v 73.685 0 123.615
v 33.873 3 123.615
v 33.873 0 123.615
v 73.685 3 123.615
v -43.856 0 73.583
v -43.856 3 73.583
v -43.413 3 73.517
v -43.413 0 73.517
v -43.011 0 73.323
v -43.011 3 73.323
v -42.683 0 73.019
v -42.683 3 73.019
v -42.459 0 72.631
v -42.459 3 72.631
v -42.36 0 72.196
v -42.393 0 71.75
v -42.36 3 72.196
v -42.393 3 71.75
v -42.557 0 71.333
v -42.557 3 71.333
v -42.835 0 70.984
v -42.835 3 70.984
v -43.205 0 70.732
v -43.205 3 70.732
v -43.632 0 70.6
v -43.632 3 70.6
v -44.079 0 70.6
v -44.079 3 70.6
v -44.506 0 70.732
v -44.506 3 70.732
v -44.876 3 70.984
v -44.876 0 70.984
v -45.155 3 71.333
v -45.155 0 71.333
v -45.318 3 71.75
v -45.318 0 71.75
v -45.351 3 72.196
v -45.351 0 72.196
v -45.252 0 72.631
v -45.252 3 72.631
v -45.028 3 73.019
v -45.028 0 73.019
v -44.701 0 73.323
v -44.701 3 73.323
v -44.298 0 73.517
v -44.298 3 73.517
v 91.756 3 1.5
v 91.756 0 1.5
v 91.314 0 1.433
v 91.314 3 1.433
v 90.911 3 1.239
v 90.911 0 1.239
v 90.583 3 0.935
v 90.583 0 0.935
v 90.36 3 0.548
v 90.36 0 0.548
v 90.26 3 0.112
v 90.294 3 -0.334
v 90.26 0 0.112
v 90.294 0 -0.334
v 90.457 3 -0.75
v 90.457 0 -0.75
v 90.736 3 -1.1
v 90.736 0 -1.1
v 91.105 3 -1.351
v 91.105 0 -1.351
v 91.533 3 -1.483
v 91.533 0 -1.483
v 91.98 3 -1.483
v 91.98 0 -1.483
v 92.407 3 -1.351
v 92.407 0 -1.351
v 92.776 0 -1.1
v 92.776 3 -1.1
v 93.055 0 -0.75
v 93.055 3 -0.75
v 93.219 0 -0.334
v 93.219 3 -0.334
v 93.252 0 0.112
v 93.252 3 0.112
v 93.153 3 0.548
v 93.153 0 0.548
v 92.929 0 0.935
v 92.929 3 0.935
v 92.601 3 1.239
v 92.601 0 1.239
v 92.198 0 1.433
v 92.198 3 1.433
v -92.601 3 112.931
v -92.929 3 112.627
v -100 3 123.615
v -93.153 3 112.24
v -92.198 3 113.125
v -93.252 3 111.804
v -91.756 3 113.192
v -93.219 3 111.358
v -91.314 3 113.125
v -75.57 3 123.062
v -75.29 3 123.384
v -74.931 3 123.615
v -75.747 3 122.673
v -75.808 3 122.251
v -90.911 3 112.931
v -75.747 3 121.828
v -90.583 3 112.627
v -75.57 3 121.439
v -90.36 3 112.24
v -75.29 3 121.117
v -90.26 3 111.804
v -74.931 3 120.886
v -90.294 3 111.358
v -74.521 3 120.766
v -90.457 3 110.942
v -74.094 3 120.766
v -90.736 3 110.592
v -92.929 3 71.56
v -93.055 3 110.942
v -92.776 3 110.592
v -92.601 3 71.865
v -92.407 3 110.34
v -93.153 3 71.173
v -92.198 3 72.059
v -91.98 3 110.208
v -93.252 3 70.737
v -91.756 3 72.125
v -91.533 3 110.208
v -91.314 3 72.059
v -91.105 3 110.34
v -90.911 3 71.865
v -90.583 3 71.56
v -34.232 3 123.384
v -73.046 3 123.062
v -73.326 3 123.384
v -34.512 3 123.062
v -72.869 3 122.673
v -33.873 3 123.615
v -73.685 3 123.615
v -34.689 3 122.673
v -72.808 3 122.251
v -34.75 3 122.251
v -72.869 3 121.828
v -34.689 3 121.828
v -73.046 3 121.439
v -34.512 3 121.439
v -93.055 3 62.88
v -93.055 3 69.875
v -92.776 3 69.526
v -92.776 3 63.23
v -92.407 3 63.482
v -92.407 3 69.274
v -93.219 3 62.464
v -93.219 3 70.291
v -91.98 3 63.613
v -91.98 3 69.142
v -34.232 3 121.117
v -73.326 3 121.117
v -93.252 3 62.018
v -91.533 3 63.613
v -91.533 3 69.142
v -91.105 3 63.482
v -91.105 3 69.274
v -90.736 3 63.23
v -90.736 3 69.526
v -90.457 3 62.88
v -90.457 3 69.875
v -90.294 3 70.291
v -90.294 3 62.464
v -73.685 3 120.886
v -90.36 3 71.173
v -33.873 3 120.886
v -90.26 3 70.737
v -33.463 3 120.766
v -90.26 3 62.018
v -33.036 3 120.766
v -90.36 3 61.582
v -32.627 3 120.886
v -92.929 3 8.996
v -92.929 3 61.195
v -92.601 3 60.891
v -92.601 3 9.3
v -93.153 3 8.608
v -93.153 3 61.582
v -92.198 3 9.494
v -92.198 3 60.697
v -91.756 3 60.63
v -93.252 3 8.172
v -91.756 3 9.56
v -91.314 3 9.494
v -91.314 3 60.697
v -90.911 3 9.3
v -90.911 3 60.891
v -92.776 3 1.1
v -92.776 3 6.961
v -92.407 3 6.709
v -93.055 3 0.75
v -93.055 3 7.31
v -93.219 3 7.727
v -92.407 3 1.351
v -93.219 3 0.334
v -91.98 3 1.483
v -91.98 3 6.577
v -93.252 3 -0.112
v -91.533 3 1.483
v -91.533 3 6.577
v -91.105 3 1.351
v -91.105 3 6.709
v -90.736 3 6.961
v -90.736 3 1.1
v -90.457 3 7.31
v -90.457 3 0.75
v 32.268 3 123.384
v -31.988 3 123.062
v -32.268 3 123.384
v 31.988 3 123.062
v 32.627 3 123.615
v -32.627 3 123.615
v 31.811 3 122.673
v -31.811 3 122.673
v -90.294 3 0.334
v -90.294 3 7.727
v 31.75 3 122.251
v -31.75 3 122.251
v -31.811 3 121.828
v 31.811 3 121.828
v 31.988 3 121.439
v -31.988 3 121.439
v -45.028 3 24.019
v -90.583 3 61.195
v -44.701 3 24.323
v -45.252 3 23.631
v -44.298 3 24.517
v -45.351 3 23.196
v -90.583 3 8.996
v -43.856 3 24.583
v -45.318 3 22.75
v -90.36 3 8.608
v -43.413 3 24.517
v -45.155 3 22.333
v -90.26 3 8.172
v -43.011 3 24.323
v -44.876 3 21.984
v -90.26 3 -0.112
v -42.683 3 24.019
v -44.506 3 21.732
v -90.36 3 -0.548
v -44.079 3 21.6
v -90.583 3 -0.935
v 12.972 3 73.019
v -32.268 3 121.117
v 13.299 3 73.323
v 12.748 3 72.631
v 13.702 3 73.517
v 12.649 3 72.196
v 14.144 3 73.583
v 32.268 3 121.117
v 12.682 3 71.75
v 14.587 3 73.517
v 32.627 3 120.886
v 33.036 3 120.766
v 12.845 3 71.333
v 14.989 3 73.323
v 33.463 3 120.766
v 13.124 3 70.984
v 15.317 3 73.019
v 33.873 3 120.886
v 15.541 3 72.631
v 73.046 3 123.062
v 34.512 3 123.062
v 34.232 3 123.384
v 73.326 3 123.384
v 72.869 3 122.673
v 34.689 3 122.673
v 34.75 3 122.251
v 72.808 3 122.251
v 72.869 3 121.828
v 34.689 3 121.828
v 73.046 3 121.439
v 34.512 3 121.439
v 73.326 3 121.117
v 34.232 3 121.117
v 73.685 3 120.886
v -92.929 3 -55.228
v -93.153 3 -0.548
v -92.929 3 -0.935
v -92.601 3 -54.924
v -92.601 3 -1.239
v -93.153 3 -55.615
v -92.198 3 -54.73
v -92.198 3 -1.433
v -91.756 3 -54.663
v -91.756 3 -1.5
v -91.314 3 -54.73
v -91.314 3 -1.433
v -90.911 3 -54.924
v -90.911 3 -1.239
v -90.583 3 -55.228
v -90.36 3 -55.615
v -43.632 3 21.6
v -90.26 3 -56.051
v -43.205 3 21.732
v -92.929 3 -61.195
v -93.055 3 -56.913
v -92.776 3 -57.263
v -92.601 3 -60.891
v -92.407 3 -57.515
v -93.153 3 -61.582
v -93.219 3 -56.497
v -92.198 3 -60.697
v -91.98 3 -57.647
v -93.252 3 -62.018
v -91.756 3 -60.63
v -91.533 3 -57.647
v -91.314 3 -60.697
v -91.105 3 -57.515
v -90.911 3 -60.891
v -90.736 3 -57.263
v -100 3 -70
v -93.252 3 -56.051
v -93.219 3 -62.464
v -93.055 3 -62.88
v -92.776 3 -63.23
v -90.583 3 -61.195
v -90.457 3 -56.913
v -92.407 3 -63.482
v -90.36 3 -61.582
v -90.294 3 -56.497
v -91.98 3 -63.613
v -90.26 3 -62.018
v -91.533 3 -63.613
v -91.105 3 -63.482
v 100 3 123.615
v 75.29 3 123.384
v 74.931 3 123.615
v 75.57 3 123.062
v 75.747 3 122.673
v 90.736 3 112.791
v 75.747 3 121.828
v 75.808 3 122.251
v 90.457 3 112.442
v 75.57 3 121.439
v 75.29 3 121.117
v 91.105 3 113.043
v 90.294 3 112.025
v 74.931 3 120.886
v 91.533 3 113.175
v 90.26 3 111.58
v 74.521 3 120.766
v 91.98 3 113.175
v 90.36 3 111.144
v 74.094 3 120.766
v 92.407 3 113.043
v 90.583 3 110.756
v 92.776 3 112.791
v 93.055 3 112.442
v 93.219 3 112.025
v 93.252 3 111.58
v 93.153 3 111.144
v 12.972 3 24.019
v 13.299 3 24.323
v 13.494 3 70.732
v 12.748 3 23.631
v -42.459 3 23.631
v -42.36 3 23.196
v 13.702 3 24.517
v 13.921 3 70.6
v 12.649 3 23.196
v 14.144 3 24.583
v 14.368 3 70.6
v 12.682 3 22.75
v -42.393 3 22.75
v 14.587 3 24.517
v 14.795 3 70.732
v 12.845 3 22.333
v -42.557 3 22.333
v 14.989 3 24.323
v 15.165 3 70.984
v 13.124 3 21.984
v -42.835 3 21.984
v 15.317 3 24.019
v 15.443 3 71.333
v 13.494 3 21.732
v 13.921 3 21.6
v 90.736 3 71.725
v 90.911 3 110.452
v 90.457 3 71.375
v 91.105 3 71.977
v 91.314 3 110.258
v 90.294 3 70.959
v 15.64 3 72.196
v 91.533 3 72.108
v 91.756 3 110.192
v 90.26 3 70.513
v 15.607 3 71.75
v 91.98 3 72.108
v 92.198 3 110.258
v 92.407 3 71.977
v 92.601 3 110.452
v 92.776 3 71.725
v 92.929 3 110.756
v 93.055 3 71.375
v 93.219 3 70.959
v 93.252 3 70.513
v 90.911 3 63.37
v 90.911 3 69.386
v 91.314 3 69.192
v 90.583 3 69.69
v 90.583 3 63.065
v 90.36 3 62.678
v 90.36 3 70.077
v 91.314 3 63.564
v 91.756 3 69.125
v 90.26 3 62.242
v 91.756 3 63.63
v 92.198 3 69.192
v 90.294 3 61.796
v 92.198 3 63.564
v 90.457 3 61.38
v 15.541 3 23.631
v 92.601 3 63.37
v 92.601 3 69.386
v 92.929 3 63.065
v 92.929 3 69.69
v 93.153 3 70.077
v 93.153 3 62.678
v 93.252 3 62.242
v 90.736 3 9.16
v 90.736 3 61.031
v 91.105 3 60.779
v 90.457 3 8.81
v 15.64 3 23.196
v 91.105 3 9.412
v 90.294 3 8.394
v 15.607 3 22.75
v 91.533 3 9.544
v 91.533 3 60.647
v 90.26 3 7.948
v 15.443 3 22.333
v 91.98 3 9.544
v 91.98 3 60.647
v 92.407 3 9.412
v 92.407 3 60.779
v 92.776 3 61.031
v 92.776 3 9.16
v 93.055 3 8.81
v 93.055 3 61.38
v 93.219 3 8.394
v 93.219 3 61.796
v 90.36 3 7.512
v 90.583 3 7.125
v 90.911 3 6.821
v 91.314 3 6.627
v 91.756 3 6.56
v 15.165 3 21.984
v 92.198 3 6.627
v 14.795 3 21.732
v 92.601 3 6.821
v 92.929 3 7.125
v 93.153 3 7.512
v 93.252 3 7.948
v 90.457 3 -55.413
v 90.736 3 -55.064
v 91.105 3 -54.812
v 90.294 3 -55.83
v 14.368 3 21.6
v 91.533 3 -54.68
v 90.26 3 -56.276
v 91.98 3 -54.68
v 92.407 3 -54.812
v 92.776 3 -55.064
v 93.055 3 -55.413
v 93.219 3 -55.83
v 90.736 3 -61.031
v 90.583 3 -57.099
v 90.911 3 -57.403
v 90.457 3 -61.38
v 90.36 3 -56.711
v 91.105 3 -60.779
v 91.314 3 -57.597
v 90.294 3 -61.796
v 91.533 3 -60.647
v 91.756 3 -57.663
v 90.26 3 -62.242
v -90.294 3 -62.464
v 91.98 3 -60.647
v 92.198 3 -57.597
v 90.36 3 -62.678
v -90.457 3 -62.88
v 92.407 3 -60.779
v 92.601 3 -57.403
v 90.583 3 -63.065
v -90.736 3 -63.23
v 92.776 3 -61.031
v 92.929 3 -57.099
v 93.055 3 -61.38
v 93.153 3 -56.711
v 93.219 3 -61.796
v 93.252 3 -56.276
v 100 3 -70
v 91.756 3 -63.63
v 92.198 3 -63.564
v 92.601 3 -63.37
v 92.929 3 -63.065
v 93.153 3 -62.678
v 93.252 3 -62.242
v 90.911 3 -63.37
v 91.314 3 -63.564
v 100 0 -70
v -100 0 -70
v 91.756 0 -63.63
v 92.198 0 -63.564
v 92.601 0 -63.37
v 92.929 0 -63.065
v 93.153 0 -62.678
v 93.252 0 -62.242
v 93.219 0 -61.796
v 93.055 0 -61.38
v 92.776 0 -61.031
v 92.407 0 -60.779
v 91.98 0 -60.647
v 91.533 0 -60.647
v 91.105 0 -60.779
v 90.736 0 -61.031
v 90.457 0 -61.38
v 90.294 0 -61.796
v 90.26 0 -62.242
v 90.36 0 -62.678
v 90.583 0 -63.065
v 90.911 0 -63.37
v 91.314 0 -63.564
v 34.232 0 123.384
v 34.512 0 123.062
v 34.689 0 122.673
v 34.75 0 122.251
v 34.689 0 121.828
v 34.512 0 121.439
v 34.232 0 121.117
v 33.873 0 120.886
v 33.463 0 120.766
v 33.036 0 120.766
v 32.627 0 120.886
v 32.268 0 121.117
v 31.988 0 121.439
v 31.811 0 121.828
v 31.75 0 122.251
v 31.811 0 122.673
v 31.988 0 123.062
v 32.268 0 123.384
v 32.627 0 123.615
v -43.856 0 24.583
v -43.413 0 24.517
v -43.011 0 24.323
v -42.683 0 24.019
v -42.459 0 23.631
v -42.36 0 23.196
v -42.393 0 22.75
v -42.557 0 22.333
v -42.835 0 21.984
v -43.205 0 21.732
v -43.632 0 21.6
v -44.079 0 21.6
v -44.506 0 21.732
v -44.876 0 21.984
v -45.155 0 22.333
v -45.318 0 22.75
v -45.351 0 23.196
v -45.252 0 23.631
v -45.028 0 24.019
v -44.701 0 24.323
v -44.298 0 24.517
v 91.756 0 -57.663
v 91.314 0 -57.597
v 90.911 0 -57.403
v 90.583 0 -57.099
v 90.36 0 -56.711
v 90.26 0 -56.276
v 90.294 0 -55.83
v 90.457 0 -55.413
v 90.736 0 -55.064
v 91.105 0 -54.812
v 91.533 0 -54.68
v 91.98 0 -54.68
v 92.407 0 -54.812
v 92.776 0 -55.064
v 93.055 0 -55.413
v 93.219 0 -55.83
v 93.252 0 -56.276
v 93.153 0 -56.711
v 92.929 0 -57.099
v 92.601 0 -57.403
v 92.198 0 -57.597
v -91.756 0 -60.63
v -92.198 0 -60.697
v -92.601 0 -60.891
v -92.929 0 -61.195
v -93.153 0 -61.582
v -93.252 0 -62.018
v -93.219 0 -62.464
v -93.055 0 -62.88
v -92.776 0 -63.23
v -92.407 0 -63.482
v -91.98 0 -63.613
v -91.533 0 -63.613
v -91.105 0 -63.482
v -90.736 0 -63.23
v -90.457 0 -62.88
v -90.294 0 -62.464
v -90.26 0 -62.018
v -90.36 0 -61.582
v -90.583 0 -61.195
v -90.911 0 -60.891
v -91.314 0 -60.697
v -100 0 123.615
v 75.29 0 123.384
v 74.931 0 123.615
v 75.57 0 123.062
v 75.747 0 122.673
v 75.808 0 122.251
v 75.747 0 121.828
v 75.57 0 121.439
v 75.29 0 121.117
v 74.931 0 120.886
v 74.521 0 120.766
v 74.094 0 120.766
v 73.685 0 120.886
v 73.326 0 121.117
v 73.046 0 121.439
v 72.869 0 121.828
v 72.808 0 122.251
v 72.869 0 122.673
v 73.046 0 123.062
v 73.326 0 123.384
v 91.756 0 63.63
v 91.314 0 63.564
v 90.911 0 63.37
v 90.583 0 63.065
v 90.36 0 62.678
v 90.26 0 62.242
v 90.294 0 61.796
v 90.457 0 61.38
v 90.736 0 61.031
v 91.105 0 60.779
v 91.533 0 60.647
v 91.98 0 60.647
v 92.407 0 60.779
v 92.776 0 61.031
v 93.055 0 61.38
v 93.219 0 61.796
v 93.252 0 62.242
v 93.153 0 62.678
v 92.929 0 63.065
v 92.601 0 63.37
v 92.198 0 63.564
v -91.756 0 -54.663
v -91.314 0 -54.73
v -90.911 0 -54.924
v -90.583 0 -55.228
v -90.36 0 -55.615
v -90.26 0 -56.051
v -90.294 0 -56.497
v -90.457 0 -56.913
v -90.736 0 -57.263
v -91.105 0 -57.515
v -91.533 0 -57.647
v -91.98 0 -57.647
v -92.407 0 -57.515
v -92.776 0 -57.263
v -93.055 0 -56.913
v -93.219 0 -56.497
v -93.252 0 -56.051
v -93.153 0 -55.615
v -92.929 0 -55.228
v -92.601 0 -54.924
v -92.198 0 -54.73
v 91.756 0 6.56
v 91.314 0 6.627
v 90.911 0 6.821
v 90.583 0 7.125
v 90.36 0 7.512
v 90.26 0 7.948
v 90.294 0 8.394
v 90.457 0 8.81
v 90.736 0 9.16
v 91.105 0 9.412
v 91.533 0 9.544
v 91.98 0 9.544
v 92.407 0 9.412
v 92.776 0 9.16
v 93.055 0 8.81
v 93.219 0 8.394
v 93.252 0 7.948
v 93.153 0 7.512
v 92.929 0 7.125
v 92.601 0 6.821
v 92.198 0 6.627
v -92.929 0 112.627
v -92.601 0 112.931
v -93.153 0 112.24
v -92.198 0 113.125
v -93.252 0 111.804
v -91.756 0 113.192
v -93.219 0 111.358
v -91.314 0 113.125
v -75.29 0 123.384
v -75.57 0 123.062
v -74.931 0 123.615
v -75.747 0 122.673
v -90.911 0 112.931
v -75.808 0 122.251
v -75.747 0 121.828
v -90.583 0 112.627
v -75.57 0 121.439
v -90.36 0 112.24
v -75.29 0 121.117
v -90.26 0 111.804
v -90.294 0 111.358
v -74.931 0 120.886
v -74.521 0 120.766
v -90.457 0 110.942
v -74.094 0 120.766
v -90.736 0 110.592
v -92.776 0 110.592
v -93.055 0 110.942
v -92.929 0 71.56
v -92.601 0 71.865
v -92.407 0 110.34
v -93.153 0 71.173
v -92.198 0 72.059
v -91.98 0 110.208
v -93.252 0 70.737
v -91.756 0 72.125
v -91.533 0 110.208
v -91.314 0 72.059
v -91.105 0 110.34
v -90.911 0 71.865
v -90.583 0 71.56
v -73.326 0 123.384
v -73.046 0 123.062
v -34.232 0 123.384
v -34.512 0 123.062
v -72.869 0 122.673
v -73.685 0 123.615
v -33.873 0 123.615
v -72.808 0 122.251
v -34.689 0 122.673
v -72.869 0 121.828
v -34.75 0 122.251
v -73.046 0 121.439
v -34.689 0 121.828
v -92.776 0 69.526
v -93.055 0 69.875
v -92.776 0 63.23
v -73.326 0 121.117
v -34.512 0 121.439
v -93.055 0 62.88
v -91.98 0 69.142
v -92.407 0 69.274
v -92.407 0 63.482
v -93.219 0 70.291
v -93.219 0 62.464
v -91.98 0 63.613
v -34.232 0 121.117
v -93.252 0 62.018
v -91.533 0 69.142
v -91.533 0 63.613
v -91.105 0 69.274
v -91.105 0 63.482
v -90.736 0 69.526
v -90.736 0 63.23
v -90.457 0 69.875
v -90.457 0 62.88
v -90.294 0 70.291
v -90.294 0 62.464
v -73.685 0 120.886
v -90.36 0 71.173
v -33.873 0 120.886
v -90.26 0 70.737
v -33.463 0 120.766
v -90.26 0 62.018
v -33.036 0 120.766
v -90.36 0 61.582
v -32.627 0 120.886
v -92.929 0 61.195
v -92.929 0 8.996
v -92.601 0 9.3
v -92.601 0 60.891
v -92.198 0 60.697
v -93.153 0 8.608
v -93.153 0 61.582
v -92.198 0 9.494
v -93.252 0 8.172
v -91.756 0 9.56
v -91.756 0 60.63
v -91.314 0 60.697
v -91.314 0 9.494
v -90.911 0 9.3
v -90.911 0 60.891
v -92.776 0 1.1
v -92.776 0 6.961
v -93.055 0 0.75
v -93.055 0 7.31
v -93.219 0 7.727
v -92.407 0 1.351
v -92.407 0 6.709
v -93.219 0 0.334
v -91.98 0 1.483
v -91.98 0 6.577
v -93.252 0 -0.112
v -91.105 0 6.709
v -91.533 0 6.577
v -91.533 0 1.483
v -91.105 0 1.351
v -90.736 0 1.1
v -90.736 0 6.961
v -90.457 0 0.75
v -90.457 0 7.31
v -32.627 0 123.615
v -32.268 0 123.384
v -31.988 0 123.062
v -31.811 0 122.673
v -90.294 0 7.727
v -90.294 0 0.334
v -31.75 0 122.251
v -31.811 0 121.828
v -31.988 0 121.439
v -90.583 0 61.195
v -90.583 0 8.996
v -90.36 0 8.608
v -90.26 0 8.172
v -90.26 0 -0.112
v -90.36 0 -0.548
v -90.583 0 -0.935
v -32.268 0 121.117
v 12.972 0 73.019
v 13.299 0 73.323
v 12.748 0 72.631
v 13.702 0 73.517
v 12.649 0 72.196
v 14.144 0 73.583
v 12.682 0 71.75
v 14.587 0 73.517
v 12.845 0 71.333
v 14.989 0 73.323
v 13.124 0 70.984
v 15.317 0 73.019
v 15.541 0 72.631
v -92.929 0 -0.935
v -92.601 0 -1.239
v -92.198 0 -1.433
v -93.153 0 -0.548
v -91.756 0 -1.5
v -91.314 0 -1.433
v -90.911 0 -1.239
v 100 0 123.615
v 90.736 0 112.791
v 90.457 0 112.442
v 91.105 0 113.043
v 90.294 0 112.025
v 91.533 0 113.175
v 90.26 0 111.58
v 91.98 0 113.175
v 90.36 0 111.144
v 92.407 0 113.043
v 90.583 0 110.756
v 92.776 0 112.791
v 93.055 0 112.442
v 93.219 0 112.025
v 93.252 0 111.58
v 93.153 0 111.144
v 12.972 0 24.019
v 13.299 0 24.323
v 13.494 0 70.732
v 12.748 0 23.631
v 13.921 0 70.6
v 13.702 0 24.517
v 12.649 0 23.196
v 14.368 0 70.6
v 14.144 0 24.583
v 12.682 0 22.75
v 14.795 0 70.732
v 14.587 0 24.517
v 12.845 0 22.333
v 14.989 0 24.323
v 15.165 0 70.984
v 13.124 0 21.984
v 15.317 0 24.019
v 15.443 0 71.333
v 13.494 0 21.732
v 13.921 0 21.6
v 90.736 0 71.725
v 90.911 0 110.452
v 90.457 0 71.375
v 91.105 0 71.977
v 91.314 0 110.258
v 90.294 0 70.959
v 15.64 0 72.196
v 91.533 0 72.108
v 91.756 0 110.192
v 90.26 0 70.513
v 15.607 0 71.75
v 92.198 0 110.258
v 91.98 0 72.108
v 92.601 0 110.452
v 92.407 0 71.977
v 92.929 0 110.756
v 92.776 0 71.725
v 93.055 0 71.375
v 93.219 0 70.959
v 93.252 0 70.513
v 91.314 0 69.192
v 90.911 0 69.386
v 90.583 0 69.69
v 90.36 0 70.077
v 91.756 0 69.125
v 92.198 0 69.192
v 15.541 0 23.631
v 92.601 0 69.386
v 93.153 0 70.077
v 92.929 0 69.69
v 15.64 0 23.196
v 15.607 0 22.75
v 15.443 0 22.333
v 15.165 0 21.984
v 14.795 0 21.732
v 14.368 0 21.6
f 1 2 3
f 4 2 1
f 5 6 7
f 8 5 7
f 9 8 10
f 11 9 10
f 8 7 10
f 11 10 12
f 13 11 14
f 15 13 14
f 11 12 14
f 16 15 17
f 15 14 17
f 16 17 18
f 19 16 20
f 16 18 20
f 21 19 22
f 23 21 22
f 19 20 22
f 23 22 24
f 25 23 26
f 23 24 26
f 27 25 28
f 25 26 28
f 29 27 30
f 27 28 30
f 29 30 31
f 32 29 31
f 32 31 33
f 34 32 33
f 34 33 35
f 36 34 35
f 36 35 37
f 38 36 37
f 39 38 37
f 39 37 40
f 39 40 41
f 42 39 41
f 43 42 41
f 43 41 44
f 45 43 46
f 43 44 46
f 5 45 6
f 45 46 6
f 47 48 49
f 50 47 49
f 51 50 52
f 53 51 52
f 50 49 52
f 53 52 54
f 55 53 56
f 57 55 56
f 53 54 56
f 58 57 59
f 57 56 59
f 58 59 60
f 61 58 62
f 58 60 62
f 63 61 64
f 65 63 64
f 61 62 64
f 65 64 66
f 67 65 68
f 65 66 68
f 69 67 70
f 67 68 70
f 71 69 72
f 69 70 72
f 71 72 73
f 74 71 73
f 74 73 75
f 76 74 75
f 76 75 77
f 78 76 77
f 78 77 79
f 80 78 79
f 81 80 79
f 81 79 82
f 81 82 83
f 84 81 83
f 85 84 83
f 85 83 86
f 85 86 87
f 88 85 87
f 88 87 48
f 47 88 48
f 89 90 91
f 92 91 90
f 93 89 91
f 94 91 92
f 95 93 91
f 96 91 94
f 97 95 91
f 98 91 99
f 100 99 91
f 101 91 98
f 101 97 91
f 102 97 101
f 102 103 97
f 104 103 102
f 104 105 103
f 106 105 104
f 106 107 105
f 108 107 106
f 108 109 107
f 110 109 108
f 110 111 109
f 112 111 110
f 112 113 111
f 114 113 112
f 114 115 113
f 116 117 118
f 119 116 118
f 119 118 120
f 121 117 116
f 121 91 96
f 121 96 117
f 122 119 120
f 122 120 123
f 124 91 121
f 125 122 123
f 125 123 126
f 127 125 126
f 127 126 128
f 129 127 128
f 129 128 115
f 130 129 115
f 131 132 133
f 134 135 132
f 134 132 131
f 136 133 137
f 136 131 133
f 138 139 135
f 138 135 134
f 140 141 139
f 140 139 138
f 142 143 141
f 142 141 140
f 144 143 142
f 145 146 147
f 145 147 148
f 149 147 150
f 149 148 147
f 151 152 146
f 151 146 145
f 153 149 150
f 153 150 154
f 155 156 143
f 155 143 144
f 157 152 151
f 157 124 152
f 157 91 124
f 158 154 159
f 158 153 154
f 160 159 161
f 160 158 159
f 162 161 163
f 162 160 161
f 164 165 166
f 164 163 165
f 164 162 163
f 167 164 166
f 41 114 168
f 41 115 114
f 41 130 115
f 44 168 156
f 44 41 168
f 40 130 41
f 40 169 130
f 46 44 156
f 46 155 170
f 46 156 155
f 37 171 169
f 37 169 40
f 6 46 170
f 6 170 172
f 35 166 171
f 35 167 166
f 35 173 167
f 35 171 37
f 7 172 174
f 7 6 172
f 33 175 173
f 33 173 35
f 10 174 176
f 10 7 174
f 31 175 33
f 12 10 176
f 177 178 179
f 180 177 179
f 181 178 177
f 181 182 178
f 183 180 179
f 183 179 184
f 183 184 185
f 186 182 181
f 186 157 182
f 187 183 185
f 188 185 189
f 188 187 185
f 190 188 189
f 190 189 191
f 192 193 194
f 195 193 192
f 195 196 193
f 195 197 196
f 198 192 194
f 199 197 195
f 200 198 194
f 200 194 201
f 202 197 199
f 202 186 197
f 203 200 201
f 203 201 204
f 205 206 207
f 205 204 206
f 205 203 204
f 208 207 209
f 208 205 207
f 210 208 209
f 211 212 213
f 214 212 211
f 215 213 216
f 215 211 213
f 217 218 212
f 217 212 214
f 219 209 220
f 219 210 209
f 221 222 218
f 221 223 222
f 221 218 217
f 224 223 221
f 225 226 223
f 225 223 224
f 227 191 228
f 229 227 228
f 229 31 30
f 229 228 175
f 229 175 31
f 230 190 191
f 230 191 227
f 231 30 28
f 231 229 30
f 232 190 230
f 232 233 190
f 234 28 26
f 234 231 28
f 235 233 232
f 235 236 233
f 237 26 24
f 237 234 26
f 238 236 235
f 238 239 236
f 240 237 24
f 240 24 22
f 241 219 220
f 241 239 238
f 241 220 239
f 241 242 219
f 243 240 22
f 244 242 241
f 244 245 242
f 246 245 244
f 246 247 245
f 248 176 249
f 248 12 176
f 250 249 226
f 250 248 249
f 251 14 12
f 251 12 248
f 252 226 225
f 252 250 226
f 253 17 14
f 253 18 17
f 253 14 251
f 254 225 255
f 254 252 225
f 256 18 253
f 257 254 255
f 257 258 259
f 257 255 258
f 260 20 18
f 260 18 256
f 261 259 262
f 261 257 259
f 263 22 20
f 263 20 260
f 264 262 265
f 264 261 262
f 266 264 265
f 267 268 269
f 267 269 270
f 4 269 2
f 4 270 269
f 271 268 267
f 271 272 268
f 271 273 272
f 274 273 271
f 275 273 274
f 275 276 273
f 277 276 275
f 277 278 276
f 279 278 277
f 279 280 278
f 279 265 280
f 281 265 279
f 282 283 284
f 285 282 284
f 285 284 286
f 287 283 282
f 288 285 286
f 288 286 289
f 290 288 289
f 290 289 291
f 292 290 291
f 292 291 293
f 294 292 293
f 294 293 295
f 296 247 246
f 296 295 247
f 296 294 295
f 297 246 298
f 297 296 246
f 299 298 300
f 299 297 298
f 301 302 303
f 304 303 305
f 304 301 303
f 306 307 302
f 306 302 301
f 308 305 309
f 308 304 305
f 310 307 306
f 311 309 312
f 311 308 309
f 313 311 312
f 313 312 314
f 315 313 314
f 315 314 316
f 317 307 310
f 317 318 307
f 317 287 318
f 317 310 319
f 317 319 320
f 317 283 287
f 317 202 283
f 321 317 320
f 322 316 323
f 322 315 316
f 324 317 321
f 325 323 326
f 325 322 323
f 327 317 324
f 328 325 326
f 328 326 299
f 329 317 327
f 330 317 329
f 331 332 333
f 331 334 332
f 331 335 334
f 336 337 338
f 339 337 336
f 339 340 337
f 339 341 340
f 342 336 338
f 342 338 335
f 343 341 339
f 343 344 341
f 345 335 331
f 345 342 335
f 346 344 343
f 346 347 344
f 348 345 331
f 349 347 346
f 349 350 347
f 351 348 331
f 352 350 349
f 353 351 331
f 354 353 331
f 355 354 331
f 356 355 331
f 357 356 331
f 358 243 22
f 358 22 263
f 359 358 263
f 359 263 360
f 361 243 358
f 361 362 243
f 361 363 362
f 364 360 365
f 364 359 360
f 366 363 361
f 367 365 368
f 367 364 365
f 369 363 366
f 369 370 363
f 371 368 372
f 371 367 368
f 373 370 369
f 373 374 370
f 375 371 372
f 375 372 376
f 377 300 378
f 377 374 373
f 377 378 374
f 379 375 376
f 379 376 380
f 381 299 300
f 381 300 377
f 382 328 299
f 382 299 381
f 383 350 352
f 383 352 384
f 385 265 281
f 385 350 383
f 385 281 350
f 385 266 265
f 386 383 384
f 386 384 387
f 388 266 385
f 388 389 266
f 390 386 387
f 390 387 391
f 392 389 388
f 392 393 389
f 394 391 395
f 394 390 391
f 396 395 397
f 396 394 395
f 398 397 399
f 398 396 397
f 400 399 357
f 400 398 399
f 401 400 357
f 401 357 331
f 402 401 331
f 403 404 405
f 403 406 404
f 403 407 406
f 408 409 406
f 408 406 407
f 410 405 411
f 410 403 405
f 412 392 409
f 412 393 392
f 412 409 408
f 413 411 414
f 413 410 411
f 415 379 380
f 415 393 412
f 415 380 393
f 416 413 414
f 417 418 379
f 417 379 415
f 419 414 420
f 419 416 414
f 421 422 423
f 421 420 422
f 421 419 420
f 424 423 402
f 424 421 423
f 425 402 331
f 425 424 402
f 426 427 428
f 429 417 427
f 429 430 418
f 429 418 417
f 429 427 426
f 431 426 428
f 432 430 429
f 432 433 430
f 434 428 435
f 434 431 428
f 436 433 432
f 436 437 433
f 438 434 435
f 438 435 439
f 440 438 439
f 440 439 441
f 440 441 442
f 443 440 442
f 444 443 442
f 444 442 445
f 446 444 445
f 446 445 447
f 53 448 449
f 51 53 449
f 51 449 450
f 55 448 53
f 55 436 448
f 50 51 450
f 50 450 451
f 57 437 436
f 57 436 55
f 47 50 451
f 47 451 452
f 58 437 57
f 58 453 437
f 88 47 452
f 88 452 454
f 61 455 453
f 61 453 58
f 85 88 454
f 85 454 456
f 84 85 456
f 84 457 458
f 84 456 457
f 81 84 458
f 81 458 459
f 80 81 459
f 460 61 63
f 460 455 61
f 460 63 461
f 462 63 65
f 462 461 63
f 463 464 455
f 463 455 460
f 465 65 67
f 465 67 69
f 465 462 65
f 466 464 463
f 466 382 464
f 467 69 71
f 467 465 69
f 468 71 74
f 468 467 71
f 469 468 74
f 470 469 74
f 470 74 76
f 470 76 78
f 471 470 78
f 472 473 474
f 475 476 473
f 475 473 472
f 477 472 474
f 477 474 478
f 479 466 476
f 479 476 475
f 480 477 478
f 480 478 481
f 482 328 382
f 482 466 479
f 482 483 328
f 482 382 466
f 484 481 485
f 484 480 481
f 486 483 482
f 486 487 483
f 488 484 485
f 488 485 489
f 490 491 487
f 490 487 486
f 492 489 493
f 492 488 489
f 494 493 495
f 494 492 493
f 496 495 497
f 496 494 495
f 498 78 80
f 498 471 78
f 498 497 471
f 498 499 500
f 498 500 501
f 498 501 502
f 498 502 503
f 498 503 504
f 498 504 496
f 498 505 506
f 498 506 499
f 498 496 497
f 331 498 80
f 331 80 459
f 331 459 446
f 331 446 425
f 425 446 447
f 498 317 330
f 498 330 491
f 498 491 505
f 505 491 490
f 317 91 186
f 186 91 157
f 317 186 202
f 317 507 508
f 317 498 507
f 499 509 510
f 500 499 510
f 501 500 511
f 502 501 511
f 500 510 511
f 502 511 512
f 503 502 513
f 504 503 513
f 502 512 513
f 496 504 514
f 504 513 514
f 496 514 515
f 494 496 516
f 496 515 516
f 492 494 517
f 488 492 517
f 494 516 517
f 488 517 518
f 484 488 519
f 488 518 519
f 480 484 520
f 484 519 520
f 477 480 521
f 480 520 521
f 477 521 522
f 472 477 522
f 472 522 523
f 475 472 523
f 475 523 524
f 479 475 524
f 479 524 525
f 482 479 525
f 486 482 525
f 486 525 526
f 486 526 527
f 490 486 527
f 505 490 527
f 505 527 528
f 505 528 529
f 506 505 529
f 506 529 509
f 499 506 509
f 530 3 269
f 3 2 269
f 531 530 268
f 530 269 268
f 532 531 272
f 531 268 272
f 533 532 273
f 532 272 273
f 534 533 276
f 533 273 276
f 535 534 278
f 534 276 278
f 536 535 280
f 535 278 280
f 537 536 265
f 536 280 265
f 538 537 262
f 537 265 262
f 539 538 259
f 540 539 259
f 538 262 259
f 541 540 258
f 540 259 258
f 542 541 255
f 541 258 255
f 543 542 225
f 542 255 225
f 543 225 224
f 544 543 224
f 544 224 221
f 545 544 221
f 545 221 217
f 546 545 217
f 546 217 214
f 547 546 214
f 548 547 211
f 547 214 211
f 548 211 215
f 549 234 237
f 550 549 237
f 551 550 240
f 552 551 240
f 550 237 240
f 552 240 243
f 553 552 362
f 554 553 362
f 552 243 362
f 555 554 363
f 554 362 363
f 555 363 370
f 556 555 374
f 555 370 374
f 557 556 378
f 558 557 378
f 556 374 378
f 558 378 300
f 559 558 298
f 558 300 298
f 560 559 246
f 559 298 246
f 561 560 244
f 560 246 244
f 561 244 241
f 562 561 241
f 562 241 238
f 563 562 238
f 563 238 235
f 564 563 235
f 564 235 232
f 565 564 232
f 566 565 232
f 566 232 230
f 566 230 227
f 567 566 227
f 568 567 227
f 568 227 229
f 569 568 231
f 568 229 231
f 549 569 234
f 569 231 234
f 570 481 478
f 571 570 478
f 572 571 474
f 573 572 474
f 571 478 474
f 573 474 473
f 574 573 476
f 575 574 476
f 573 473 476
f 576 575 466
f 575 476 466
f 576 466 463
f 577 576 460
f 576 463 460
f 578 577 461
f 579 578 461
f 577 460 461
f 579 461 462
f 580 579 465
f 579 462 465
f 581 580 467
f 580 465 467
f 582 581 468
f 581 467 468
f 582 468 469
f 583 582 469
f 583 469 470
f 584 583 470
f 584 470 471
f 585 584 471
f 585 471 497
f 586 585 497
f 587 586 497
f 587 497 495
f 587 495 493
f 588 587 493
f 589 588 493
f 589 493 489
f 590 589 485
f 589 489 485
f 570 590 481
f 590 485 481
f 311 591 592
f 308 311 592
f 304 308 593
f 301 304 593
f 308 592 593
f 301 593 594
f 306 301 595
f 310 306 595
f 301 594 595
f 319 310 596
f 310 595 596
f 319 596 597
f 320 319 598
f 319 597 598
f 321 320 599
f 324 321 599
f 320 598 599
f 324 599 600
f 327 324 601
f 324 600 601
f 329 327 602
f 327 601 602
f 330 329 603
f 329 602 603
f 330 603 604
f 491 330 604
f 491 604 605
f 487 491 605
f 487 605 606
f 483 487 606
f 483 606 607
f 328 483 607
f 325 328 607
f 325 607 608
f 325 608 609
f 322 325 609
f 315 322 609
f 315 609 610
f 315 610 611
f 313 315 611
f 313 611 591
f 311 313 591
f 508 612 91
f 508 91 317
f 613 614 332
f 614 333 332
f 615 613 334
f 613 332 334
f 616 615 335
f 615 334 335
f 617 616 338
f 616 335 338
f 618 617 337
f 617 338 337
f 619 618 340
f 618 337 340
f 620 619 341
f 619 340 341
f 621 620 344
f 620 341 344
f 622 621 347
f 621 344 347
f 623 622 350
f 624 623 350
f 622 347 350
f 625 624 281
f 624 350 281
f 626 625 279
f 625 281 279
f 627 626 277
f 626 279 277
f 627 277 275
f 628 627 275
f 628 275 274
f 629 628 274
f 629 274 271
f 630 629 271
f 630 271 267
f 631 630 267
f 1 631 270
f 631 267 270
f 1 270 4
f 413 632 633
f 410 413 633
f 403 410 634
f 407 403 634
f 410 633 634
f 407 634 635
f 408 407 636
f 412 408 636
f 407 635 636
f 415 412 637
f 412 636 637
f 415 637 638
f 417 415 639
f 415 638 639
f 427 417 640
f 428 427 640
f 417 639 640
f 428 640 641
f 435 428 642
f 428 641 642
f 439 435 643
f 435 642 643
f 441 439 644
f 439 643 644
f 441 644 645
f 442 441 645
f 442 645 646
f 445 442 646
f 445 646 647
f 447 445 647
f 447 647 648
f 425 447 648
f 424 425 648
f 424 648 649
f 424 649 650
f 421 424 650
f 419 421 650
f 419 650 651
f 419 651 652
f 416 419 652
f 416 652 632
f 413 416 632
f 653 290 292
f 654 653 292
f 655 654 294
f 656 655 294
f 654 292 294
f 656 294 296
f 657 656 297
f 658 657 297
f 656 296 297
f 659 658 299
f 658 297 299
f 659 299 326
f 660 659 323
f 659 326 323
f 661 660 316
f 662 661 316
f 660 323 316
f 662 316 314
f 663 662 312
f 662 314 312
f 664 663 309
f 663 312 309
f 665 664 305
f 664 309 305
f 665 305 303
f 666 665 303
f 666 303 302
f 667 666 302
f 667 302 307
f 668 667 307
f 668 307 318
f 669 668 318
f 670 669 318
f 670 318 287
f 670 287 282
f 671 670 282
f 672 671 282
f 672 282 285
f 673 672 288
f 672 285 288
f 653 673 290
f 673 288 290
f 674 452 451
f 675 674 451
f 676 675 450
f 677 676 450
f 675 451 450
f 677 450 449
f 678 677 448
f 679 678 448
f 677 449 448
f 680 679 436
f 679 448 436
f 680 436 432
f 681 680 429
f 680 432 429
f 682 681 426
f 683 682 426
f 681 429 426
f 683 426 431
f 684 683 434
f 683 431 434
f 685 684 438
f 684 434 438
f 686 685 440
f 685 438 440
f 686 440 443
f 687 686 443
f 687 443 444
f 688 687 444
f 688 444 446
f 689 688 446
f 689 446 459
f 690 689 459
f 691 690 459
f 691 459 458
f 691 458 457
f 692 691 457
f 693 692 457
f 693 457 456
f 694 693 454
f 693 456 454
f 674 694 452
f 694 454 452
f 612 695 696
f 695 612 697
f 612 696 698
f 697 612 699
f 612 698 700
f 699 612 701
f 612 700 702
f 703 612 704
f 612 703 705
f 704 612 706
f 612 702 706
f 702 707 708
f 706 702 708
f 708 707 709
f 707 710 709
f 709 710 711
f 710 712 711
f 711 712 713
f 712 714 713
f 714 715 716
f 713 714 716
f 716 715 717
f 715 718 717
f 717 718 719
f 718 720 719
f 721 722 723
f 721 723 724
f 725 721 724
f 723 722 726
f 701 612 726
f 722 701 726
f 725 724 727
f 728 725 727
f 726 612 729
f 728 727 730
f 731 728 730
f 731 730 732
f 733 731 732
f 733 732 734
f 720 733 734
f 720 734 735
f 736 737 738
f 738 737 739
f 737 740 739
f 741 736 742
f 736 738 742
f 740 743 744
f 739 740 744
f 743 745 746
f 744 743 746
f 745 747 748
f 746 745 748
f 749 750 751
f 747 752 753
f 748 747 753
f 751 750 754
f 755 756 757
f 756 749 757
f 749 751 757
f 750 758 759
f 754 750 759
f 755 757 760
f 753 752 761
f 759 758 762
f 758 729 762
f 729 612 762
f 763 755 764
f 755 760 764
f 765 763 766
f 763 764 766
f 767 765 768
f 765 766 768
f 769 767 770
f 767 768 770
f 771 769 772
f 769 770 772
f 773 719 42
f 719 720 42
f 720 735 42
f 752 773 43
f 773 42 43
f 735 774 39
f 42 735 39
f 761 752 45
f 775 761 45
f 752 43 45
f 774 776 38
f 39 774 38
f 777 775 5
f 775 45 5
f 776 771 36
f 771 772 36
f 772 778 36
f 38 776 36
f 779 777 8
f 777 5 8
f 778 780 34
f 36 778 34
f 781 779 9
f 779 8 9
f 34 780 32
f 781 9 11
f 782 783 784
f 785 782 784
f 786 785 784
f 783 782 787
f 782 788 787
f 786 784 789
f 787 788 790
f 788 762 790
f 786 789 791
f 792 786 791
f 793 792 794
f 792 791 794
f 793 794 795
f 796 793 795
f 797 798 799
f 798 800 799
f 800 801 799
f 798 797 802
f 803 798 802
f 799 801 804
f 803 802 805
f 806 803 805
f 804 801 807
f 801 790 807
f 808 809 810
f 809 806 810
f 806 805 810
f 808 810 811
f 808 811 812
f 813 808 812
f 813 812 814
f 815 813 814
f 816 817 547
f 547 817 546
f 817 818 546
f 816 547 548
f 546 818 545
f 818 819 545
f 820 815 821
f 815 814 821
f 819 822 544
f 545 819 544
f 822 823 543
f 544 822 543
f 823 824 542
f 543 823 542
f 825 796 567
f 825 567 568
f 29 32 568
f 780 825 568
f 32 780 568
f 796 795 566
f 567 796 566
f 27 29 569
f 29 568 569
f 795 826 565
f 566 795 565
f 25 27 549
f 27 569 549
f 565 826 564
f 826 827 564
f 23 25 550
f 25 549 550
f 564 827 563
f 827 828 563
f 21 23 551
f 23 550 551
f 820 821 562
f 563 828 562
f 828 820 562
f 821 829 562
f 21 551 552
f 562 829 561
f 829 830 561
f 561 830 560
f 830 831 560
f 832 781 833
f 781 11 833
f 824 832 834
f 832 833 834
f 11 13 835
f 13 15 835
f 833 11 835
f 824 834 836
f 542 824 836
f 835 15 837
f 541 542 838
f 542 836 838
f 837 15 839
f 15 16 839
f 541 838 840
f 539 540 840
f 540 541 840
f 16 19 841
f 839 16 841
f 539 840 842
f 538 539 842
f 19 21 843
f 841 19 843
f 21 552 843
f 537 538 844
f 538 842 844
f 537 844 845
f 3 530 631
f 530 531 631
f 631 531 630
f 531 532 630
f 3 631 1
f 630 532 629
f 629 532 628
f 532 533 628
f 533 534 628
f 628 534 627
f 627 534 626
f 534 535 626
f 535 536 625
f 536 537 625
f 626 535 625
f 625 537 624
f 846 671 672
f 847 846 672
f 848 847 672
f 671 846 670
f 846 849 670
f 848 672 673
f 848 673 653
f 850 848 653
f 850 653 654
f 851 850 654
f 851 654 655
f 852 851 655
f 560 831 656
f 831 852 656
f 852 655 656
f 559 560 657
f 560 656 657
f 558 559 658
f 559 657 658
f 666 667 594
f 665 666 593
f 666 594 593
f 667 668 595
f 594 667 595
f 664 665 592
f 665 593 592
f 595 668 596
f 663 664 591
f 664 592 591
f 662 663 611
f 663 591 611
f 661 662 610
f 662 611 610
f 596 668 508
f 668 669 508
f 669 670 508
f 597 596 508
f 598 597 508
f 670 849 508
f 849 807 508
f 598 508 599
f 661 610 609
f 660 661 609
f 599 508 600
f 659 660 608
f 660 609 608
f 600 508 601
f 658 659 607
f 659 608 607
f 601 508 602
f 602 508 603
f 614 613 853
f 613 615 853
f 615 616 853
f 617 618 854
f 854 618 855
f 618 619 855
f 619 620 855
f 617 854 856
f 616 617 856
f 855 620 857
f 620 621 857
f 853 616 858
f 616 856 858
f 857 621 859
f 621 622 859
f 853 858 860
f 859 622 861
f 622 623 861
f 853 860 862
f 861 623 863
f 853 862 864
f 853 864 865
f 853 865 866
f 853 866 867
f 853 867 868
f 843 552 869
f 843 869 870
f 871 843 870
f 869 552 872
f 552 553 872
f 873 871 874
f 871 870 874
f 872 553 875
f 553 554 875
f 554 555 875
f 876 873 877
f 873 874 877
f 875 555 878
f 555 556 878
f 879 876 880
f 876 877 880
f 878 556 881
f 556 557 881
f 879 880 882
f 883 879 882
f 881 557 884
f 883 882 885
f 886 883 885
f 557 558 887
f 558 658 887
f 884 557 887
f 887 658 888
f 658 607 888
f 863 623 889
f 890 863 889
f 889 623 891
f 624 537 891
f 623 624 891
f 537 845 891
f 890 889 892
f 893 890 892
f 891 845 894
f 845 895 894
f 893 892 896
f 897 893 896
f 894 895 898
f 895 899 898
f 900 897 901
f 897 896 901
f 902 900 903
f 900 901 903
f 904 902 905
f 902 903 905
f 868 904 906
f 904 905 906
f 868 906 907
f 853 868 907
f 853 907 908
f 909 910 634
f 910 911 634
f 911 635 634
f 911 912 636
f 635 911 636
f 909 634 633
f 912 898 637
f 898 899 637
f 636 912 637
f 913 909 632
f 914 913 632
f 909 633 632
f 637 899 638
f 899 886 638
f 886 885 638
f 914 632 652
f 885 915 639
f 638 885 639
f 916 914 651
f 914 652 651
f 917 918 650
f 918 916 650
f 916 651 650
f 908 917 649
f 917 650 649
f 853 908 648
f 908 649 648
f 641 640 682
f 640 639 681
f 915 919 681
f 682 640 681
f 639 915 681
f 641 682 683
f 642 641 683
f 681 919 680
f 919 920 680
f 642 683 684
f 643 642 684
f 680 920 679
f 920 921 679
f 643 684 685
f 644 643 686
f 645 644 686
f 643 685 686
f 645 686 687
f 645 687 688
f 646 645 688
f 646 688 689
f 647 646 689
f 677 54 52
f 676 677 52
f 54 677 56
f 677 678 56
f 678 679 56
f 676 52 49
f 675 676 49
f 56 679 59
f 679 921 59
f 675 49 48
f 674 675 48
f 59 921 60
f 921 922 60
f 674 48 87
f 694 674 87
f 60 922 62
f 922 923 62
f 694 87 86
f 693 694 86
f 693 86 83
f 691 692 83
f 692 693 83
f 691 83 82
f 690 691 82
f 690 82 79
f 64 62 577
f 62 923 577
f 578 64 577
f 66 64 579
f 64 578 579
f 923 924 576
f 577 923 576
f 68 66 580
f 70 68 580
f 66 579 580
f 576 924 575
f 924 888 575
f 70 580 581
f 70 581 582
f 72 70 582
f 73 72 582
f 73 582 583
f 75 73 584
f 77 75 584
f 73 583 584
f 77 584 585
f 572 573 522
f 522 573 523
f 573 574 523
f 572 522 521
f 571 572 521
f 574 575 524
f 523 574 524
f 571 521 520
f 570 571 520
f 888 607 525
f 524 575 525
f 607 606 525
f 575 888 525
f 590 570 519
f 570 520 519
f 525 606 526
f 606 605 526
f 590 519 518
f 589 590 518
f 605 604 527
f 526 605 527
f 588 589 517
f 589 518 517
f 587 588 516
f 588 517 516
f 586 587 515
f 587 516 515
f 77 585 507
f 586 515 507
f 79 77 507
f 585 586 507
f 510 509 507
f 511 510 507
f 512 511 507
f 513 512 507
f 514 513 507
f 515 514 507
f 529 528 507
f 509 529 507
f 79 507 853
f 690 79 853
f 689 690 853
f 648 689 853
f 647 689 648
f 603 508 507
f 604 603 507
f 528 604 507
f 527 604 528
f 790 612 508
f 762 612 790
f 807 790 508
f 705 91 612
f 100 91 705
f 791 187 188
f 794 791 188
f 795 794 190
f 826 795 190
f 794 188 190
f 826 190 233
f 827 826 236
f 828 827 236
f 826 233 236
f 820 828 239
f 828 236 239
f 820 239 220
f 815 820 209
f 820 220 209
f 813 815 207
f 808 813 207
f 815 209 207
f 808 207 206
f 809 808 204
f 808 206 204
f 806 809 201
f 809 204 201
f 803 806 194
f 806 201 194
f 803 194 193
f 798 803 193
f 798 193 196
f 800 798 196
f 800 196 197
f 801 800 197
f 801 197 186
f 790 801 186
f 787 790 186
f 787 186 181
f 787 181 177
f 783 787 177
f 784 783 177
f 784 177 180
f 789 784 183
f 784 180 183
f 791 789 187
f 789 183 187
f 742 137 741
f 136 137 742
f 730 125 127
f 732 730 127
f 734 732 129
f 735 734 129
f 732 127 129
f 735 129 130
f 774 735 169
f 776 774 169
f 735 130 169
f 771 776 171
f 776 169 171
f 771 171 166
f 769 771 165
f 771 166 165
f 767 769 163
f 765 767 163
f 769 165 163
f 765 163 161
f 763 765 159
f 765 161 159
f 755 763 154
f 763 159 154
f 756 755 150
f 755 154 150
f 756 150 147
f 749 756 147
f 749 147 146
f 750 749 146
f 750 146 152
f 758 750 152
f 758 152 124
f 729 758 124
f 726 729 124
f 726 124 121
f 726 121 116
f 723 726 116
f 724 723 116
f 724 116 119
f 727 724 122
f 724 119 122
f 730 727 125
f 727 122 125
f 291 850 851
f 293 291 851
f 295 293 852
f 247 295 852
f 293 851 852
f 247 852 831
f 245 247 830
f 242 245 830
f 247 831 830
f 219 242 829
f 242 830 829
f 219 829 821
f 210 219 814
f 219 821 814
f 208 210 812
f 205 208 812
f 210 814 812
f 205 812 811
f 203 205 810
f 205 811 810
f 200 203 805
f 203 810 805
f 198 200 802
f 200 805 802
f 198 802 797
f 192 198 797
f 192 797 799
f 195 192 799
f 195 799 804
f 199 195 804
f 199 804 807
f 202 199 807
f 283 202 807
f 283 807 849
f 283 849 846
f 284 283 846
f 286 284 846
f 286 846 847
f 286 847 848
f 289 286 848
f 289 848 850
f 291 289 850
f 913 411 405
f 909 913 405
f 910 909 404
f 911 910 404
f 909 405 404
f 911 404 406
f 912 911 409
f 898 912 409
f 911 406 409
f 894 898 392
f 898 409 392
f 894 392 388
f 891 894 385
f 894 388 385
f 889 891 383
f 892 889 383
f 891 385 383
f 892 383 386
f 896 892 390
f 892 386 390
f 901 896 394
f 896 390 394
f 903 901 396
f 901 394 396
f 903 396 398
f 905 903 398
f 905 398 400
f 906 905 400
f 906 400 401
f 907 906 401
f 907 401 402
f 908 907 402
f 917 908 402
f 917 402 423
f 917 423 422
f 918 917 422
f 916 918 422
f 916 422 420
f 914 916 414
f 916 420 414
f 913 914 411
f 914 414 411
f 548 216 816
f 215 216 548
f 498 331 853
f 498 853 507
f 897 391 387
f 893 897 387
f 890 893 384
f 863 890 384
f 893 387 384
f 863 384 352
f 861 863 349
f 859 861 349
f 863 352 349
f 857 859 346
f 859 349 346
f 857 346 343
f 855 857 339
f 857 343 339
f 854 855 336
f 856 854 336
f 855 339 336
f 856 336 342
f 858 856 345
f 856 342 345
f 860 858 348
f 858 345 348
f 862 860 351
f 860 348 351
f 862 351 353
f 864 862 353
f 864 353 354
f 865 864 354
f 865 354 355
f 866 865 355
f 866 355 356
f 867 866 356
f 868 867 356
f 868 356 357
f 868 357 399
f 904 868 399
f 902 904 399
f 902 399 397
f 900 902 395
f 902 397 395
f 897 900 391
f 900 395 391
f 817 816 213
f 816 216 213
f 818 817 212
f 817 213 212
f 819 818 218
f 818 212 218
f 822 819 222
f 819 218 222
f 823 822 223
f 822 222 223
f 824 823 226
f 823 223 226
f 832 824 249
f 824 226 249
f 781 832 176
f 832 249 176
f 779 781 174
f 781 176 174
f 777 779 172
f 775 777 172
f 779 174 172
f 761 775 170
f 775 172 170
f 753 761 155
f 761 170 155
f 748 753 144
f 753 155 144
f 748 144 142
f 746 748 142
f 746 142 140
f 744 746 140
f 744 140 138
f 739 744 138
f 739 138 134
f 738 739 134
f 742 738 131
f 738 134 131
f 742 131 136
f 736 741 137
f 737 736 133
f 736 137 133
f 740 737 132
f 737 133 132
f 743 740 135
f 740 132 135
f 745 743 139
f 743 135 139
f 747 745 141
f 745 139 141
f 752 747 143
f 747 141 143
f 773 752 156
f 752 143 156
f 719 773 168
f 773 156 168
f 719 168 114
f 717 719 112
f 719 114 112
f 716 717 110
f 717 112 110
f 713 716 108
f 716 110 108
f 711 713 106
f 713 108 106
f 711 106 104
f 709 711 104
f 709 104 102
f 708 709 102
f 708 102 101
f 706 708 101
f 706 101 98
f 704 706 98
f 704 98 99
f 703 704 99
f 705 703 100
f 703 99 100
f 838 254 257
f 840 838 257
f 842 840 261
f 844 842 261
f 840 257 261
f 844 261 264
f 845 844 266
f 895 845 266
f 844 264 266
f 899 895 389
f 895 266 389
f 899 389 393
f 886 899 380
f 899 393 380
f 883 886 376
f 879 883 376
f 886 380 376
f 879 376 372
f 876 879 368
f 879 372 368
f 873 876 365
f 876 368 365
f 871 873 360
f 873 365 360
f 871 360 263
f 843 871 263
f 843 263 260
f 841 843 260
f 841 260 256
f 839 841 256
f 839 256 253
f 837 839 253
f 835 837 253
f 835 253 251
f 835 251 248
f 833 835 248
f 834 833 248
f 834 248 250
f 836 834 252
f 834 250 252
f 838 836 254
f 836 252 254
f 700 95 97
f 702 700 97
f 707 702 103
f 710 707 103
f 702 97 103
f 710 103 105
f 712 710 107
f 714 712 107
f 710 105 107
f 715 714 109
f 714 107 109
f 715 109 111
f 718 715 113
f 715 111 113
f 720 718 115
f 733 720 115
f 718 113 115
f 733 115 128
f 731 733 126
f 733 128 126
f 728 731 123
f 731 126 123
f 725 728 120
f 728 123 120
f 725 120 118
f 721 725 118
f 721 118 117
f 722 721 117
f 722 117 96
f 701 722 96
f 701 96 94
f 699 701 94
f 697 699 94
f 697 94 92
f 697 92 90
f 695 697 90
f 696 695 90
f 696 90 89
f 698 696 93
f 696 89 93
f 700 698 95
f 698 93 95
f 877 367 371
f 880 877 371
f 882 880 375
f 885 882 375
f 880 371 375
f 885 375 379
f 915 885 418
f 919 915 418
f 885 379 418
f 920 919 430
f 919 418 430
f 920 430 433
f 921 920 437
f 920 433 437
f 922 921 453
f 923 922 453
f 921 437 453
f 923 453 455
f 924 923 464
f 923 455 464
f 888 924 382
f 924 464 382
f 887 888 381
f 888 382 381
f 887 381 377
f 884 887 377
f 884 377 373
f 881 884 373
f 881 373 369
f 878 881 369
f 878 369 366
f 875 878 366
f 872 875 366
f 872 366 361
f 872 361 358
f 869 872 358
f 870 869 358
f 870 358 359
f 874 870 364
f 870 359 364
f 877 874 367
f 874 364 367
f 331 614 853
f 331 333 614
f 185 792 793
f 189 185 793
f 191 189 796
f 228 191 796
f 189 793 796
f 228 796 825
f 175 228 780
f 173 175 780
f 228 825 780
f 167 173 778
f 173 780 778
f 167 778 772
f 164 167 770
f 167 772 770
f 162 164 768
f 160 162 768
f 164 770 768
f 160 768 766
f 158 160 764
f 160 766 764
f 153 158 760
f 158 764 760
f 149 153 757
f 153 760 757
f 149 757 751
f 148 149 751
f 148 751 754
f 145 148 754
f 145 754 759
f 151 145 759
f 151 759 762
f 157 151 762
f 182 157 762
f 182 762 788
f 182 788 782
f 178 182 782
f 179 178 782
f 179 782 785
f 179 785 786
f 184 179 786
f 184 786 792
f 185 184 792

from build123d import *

# Parameters (mm, degrees)
SKETCH_1_W          = 200
SKETCH_1_H          = 140
EXTRUDE_1_DEPTH     = 3
SKETCH_2_R          = 1.5
SKETCH_2_W          = 160
SKETCH_2_H          = 130.210911355
CUT_EXTRUDE_1_DEPTH = 6
SKETCH_3_W          = 18.058491918
SKETCH_3_H          = 53.614911852
EXTRUDE_2_DEPTH     = 3
SKETCH_4_R          = 1.5
CUT_EXTRUDE_2_DEPTH = 3
SKETCH_5_W          = 160
SKETCH_5_H          = 3
EXTRUDE_3_DEPTH     = 130.210911355
SKETCH_6_W          = 163.883016164
SKETCH_6_H          = 3
EXTRUDE_5_DEPTH     = 53.614911852
SKETCH_7_R          = 1.5
CUT_EXTRUDE_3_DEPTH = 5
SKETCH_8_R          = 1.5
CUT_EXTRUDE_4_DEPTH = 3
SKETCH_9_R          = 1.5
CUT_EXTRUDE_5_DEPTH = 3


with BuildPart() as part:
    # 草图1 → 凸台-拉伸1 (new body)
    with BuildSketch(Plane(origin=(0, 0, 0), x_dir=(1, 0, 0), z_dir=(0, 1, 0))):
        Rectangle(SKETCH_1_W, SKETCH_1_H)
    extrude(amount=EXTRUDE_1_DEPTH)

    # 草图2 → 切除-拉伸1 (cut)
    with BuildSketch(Plane.XZ):
        with Locations(Location((91.756220162, -62.130143817, 0), (0, 0, 270))):
            Circle(SKETCH_2_R)
        with Locations(Location((-91.756220162, -62.130143817, 0), (0, 0, 90))):
            Circle(SKETCH_2_R)
        with Locations(Location((91.756220162, 62.130143817, 0), (0, 0, 90))):
            Circle(SKETCH_2_R)
        with Locations(Location((-91.756220162, 62.130143817, 0), (0, 0, 270))):
            Circle(SKETCH_2_R)
        with Locations(Location((-91.756220162, 0, 0), (0, 0, 270))):
            Circle(SKETCH_2_R)
        with Locations(Location((91.756220162, 0, 0), (0, 0, 90))):
            Circle(SKETCH_2_R)
        with Locations((0, -4.894544322)):
            Rectangle(SKETCH_2_W, SKETCH_2_H)
    extrude(amount=-CUT_EXTRUDE_1_DEPTH, mode=Mode.SUBTRACT)

    # 草图3 → 凸台-拉伸2 (add)
    with BuildSketch(Plane(origin=(0, 3, 0), x_dir=(1, 0, 0), z_dir=(0, 1, 0))):
        with Locations((90.970754041, -96.807455926)):
            Rectangle(SKETCH_3_W, SKETCH_3_H)
        with Locations((-90.970754041, -96.807455926)):
            Rectangle(SKETCH_3_W, SKETCH_3_H)
    extrude(amount=-EXTRUDE_2_DEPTH)

    # 草图4 → 切除-拉伸2 (cut)
    with BuildSketch(Plane(origin=(0, 3, 0), x_dir=(1, 0, 0), z_dir=(0, 1, 0))):
        with Locations(Location((-91.756220162, -111.691638535, 0), (0, 0, 270))):
            Circle(SKETCH_4_R)
        with Locations(Location((91.756220162, -111.691638535, 0), (0, 0, 90))):
            Circle(SKETCH_4_R)
    extrude(amount=-CUT_EXTRUDE_2_DEPTH, mode=Mode.SUBTRACT)

    # 草图5 → 凸台-拉伸3 (add)
    with BuildSketch(Plane(origin=(0, 0, 60.210911355), x_dir=(-1, 0, 0), z_dir=(0, 0, -1))):
        with Locations((0, 1.5)):
            Rectangle(SKETCH_5_W, SKETCH_5_H)
    extrude(amount=EXTRUDE_3_DEPTH)

    # 草图6 → 凸台-拉伸5 (add)
    with BuildSketch(Plane.XY.offset(70)):
        with Locations((0, 1.5)):
            Rectangle(SKETCH_6_W, SKETCH_6_H)
    extrude(amount=EXTRUDE_5_DEPTH)

    # 草图7 → 切除-拉伸3 (cut)
    with BuildSketch(Plane(origin=(0, 3, 0), x_dir=(1, 0, 0), z_dir=(0, 1, 0))):
        with Locations((-74.307985478, -122.25026612)):
            Circle(SKETCH_7_R)
        with Locations((-33.249974851, -122.25026612)):
            Circle(SKETCH_7_R)
        with Locations((33.249974851, -122.25026612)):
            Circle(SKETCH_7_R)
        with Locations((74.307985478, -122.25026612)):
            Circle(SKETCH_7_R)
    extrude(amount=-CUT_EXTRUDE_3_DEPTH, mode=Mode.SUBTRACT)

    # 草图8 → 切除-拉伸4 (cut)
    with BuildSketch(Plane(origin=(0, 3, 0), x_dir=(1, 0, 0), z_dir=(0, 1, 0))):
        with Locations(Location((14.144450177, -23.083468073, 0), (0, 0, 270))):
            Circle(SKETCH_8_R)
        with Locations(Location((-43.855549823, -23.083468073, 0), (0, 0, 270))):
            Circle(SKETCH_8_R)
        with Locations(Location((-43.855549823, -72.083468073, 0), (0, 0, 270))):
            Circle(SKETCH_8_R)
        with Locations(Location((14.144450177, -72.083468073, 0), (0, 0, 270))):
            Circle(SKETCH_8_R)
    extrude(amount=-CUT_EXTRUDE_4_DEPTH, mode=Mode.SUBTRACT)

    # 草图9 → 切除-拉伸5 (cut)
    with BuildSketch(Plane(origin=(0, 3, 0), x_dir=(1, 0, 0), z_dir=(0, 1, 0))):
        with Locations(Location((-91.756220162, -70.625190386, 0), (0, 0, 270))):
            Circle(SKETCH_9_R)
        with Locations(Location((-91.756220162, -8.060389113, 0), (0, 0, 270))):
            Circle(SKETCH_9_R)
        with Locations(Location((-91.756220162, 56.163438047, 0), (0, 0, 270))):
            Circle(SKETCH_9_R)
        with Locations(Location((91.756220162, 56.163438047, 0), (0, 0, 90))):
            Circle(SKETCH_9_R)
        with Locations(Location((91.756220162, -8.060389113, 0), (0, 0, 90))):
            Circle(SKETCH_9_R)
        with Locations(Location((91.756220162, -70.625190386, 0), (0, 0, 90))):
            Circle(SKETCH_9_R)
    extrude(amount=-CUT_EXTRUDE_5_DEPTH, mode=Mode.SUBTRACT)


solid = part.part
